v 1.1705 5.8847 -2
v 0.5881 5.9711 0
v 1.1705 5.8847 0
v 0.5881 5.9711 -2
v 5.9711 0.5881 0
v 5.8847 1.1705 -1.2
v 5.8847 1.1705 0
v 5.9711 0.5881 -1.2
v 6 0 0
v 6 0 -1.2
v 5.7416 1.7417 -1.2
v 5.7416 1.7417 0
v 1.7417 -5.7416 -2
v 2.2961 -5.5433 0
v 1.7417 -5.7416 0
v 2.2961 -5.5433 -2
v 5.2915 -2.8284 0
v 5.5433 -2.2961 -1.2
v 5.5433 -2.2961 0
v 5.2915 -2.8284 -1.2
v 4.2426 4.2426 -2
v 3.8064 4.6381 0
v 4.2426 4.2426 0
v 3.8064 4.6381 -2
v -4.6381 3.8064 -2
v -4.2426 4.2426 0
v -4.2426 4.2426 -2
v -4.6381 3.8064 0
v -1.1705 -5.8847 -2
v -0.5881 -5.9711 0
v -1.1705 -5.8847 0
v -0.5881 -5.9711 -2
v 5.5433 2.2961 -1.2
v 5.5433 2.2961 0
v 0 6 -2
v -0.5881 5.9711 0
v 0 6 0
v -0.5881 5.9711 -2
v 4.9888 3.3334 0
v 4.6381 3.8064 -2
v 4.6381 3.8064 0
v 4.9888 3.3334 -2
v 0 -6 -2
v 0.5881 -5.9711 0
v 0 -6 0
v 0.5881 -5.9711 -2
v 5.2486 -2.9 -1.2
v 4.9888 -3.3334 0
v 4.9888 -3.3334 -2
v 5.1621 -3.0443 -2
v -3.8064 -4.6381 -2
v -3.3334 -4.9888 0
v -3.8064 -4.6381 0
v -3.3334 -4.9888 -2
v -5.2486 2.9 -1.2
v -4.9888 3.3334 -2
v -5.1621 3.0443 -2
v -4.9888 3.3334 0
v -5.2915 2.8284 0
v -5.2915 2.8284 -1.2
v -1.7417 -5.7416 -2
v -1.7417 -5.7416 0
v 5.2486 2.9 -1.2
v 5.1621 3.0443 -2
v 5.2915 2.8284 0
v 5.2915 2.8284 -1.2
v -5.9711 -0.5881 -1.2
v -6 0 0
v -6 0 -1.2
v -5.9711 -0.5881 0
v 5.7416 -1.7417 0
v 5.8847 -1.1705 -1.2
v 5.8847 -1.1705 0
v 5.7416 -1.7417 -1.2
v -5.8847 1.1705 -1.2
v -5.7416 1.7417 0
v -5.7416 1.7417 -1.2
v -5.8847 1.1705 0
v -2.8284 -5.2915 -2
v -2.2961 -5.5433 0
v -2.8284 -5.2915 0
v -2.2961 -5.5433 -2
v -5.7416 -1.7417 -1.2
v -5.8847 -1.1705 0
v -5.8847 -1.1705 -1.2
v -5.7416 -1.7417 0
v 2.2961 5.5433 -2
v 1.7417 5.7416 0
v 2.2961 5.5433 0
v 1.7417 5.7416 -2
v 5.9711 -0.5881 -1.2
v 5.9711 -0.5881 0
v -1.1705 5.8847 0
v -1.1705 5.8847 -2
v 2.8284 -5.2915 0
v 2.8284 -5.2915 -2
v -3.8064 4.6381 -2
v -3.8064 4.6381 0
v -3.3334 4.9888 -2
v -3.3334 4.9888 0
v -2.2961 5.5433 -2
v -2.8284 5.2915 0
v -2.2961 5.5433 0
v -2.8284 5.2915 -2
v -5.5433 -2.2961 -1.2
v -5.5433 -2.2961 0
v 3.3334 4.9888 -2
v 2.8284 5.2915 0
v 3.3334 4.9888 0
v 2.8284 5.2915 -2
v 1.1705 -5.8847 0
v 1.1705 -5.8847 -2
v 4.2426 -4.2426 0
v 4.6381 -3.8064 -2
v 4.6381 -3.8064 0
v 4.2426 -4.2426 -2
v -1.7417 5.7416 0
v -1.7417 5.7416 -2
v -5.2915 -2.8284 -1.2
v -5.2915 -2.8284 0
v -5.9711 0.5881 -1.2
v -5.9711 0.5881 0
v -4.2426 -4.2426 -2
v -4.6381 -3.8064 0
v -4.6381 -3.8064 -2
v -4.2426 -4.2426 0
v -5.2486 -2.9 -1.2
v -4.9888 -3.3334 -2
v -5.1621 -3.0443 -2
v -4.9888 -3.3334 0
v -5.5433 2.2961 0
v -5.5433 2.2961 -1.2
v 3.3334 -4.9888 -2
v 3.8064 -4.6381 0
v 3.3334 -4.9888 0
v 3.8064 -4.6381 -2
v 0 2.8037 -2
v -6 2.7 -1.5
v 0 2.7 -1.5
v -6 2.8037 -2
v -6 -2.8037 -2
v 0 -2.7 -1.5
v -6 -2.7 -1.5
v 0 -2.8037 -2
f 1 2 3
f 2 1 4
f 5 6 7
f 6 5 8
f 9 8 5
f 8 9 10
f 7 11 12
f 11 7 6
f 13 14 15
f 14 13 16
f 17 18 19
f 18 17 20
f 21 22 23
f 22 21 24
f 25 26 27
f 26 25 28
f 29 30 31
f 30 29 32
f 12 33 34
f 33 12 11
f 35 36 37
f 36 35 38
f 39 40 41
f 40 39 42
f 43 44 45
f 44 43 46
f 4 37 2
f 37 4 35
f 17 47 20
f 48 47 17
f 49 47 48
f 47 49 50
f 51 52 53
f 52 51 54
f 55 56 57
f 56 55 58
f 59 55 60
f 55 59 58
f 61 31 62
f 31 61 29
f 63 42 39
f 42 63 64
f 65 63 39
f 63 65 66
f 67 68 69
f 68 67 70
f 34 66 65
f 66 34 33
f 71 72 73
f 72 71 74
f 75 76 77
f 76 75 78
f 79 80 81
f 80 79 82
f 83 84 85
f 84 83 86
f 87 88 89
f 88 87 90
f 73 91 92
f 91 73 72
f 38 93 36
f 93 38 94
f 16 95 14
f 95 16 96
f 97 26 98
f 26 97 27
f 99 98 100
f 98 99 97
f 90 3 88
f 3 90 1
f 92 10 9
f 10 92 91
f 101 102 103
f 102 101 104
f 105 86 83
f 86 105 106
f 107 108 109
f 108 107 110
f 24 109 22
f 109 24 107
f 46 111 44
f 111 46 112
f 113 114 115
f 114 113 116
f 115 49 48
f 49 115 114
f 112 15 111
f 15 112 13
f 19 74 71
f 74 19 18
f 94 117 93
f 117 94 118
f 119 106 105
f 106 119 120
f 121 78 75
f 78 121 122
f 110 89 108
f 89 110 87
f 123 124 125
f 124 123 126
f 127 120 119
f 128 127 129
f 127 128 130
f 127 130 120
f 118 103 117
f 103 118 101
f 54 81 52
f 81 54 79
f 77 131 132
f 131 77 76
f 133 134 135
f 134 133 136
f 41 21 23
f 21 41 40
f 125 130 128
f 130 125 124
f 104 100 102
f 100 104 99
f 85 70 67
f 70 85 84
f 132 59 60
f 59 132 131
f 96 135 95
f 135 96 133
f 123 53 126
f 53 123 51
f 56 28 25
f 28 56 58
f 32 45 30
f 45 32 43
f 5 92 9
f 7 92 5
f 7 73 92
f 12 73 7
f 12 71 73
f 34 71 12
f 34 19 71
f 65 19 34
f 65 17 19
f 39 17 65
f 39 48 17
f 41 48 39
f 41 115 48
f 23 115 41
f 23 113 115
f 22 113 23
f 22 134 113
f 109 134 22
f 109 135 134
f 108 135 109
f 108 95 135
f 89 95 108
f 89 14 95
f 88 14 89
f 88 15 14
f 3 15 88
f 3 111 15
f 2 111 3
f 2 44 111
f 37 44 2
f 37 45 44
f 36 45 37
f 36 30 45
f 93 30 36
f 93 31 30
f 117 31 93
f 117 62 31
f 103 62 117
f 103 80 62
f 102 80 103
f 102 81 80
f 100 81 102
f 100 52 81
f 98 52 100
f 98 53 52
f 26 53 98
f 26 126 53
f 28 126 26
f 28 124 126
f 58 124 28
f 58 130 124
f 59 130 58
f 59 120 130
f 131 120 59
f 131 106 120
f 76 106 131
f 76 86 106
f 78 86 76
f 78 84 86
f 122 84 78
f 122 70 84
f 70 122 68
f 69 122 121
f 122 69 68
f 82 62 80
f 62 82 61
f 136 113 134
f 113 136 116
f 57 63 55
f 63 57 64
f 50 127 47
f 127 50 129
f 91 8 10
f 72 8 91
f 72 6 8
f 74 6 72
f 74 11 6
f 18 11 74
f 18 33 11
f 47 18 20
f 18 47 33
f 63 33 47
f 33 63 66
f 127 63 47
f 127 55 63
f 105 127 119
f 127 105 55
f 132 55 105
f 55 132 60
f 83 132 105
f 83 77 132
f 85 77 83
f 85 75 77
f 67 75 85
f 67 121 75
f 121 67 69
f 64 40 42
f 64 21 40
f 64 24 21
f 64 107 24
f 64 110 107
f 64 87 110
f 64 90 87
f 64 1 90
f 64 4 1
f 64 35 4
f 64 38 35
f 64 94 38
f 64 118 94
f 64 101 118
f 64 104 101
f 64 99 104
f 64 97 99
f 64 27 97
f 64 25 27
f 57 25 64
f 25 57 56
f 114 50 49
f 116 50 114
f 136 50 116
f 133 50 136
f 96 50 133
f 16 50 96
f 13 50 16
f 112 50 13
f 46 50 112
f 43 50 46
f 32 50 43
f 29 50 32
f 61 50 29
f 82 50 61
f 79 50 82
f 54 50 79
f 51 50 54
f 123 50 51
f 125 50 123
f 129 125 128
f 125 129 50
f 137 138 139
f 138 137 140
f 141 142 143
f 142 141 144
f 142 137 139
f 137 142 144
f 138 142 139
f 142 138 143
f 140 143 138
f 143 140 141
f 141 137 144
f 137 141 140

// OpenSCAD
// file: B_dovetail.scad
// =============================================================================
// Design B — Co-printed dovetail / T-slot mechanical interlock (PRIMARY)
// =============================================================================
// PETG strut tip ends in a captive dovetail / T-slot socket; the TPU cable is
// terminated in a matching dovetail / T-head co-printed inside the socket.
// Per Edison Phase-3 ANALYSIS 19e0c868 §2 (CAD review) geometry, which
// supersedes the earlier ce84ddf8 §4 numbers:
//   - Node OD:                 12.0 mm (was 9.0; needed for >=2 perimeters
//                                       on the lateral PETG cheeks)
//   - Slot mouth width:         5.4 mm (allows solid bridging over the gap)
//   - TPU head width (undercut):7.06 mm (≈0.83 mm undercut per side)
//   - Slot internal height:     4.0 mm
//   - Slot depth (along strut): 6.0 mm (>=4-6 mm engagement plateau, Wang 2026)
//   - Dovetail flank angle:    22.5° (Wang 2026 shear-strength optimum for
//                                     bi-material FDM rigid-flexible interlock)
//   - Lateral (Y) clearance:    0.20 mm per face (load-bearing fit, Ermolai 2024)
//   - Roof (Z) clearance:       0.30 mm (bridge sag tolerance, Ermolai 2024)
//   - +X exit fillet:           0.5 mm (de-notches TPU cable redirection,
//                                       Frascio 2024)
// Strut runs along +Z; cable exits along +X. The PETG cap above the head
// (the "roof") is the print-in-place bridge that captures the TPU dovetail.
// =============================================================================
include <_common.scad>

slot_mouth   = 5.4;
slot_inner   = 7.06;
slot_height  = 4.0;
slot_depth   = 6.0;       // along strut axis (Z)
flank_deg    = 22.5;      // half-flank, measured from vertical wall
clear_lat    = 0.20;      // lateral (Y, load-bearing) running clearance per face
clear_roof   = 0.30;      // roof (Z) clearance per face — bridge-sag tolerance
mouth_fillet = 0.5;       // PETG slot-mouth +X exit fillet (TPU de-notch)
node_d       = 12.0;      // PETG socket outer diameter near tip

// Dovetail / T-head extruded along +X (X = depth into slot).
// The cross-section in (Y,Z) is wider at the bottom (slot_inner) than the
// top (slot_mouth) — that is the "captive" undercut.
module dovetail_xs(width_top, width_bot, height) {
    polygon(points = [
        [-width_top/2,  height/2],
        [ width_top/2,  height/2],
        [ width_bot/2, -height/2],
        [-width_bot/2, -height/2],
    ]);
}

module designB_petg() {
    difference() {
        union() {
            translate([0, 0, -slot_depth - 0.5])
                cylinder(h=slot_depth + 0.5, d=node_d);
            translate([0, 0, -strut_l])
                cylinder(h=strut_l - slot_depth, d=strut_d);
        }
        // Dovetail pocket — wide at the bottom (captive). Differential clearance:
        // tight on the lateral (Y) load-bearing flanks (`clear_lat`), looser on
        // the roof (Z) for bridge-sag tolerance (`clear_roof`).
        translate([-(node_d/2 + 0.1), 0, -slot_depth/2 - 0.5])
            rotate([90, 0, 90])
                linear_extrude(height = node_d + 0.2 + clear_lat)
                    dovetail_xs(slot_mouth + 2*clear_lat,
                                slot_inner + 2*clear_lat,
                                slot_height + 2*clear_roof);
    }
}

module designB_tpu() {
    // Head: dovetail cross-section extruded along the slot depth (the -X half of
    // the through-slot, x ∈ [-node_d/2, -node_d/2 + slot_depth] = [-6, 0]).
    translate([-node_d/2, 0, -slot_depth/2 - 0.5])
        rotate([90, 0, 90])
            linear_extrude(height = slot_depth)
                dovetail_xs(slot_mouth, slot_inner, slot_height);
    // Cable exits the +X face of the node along the slot centerline (Z = head
    // center, NOT z=0). Starts at x=0 (the +X face of the head) so the cable
    // is mechanically continuous with the dovetail head and emerges through
    // the slot mouth on the +X face of the PETG node.
    translate([0, 0, -slot_depth/2 - 0.5]) rotate([0, 90, 0])
        cylinder(h=cable_l, d=cable_d);
}

module designB() {
    petg() designB_petg();
    tpu()  designB_tpu();
}

designB();
// file: _common.scad
// Shared parameters for the five candidate PETG-strut + TPU-cable joint
// designs explored in `edison-trajectories/joint-design/`.
//
// Coordinate convention (per design): the PETG strut runs along +Z and the
// TPU cable runs along the global +X direction (so the joint plane is the
// X-Z plane). All units in mm. PETG is rendered orange, TPU dark cyan.
strut_d = 6.0;     // PETG strut diameter (matches t3-prism.scad)
cable_d = 2.4;     // TPU cable diameter (matches t3-prism.scad)
strut_l = 18.0;    // visible strut length to render
cable_l = 30.0;    // visible cable length on each side
$fn = 64;

PETG_RGB = [0.95, 0.55, 0.20];
TPU_RGB  = [0.10, 0.55, 0.55];

module petg() { color(PETG_RGB) children(); }
module tpu()  { color(TPU_RGB)  children(); }

// Strut as a vertical capsule along +Z, tip at z = 0, body extending to -strut_l.
module strut_body(length = strut_l, d = strut_d) {
    translate([0, 0, -length]) cylinder(h=length, d=d);
    sphere(d=d);
}

// Straight TPU cable along +X.
module cable_segment(length = cable_l, d = cable_d, x0 = 0) {
    translate([x0, 0, 0])
        rotate([0, 90, 0])
            cylinder(h=length, d=d);
}
// main file
// Section view of Design B — cut at the Z=0 plane, keep +Z half above the joint mid-plane (cut at Z=-2).
// Apply intersection per-color part so PETG/TPU colors survive the CSG.
include <_common.scad>
use <B_dovetail.scad>

module half_cube_Z() { translate([-30, -30, -2]) cube([60, 60, 60]); }

petg() intersection() { designB_petg(); half_cube_Z(); }
tpu()  intersection() { designB_tpu();  half_cube_Z(); }
